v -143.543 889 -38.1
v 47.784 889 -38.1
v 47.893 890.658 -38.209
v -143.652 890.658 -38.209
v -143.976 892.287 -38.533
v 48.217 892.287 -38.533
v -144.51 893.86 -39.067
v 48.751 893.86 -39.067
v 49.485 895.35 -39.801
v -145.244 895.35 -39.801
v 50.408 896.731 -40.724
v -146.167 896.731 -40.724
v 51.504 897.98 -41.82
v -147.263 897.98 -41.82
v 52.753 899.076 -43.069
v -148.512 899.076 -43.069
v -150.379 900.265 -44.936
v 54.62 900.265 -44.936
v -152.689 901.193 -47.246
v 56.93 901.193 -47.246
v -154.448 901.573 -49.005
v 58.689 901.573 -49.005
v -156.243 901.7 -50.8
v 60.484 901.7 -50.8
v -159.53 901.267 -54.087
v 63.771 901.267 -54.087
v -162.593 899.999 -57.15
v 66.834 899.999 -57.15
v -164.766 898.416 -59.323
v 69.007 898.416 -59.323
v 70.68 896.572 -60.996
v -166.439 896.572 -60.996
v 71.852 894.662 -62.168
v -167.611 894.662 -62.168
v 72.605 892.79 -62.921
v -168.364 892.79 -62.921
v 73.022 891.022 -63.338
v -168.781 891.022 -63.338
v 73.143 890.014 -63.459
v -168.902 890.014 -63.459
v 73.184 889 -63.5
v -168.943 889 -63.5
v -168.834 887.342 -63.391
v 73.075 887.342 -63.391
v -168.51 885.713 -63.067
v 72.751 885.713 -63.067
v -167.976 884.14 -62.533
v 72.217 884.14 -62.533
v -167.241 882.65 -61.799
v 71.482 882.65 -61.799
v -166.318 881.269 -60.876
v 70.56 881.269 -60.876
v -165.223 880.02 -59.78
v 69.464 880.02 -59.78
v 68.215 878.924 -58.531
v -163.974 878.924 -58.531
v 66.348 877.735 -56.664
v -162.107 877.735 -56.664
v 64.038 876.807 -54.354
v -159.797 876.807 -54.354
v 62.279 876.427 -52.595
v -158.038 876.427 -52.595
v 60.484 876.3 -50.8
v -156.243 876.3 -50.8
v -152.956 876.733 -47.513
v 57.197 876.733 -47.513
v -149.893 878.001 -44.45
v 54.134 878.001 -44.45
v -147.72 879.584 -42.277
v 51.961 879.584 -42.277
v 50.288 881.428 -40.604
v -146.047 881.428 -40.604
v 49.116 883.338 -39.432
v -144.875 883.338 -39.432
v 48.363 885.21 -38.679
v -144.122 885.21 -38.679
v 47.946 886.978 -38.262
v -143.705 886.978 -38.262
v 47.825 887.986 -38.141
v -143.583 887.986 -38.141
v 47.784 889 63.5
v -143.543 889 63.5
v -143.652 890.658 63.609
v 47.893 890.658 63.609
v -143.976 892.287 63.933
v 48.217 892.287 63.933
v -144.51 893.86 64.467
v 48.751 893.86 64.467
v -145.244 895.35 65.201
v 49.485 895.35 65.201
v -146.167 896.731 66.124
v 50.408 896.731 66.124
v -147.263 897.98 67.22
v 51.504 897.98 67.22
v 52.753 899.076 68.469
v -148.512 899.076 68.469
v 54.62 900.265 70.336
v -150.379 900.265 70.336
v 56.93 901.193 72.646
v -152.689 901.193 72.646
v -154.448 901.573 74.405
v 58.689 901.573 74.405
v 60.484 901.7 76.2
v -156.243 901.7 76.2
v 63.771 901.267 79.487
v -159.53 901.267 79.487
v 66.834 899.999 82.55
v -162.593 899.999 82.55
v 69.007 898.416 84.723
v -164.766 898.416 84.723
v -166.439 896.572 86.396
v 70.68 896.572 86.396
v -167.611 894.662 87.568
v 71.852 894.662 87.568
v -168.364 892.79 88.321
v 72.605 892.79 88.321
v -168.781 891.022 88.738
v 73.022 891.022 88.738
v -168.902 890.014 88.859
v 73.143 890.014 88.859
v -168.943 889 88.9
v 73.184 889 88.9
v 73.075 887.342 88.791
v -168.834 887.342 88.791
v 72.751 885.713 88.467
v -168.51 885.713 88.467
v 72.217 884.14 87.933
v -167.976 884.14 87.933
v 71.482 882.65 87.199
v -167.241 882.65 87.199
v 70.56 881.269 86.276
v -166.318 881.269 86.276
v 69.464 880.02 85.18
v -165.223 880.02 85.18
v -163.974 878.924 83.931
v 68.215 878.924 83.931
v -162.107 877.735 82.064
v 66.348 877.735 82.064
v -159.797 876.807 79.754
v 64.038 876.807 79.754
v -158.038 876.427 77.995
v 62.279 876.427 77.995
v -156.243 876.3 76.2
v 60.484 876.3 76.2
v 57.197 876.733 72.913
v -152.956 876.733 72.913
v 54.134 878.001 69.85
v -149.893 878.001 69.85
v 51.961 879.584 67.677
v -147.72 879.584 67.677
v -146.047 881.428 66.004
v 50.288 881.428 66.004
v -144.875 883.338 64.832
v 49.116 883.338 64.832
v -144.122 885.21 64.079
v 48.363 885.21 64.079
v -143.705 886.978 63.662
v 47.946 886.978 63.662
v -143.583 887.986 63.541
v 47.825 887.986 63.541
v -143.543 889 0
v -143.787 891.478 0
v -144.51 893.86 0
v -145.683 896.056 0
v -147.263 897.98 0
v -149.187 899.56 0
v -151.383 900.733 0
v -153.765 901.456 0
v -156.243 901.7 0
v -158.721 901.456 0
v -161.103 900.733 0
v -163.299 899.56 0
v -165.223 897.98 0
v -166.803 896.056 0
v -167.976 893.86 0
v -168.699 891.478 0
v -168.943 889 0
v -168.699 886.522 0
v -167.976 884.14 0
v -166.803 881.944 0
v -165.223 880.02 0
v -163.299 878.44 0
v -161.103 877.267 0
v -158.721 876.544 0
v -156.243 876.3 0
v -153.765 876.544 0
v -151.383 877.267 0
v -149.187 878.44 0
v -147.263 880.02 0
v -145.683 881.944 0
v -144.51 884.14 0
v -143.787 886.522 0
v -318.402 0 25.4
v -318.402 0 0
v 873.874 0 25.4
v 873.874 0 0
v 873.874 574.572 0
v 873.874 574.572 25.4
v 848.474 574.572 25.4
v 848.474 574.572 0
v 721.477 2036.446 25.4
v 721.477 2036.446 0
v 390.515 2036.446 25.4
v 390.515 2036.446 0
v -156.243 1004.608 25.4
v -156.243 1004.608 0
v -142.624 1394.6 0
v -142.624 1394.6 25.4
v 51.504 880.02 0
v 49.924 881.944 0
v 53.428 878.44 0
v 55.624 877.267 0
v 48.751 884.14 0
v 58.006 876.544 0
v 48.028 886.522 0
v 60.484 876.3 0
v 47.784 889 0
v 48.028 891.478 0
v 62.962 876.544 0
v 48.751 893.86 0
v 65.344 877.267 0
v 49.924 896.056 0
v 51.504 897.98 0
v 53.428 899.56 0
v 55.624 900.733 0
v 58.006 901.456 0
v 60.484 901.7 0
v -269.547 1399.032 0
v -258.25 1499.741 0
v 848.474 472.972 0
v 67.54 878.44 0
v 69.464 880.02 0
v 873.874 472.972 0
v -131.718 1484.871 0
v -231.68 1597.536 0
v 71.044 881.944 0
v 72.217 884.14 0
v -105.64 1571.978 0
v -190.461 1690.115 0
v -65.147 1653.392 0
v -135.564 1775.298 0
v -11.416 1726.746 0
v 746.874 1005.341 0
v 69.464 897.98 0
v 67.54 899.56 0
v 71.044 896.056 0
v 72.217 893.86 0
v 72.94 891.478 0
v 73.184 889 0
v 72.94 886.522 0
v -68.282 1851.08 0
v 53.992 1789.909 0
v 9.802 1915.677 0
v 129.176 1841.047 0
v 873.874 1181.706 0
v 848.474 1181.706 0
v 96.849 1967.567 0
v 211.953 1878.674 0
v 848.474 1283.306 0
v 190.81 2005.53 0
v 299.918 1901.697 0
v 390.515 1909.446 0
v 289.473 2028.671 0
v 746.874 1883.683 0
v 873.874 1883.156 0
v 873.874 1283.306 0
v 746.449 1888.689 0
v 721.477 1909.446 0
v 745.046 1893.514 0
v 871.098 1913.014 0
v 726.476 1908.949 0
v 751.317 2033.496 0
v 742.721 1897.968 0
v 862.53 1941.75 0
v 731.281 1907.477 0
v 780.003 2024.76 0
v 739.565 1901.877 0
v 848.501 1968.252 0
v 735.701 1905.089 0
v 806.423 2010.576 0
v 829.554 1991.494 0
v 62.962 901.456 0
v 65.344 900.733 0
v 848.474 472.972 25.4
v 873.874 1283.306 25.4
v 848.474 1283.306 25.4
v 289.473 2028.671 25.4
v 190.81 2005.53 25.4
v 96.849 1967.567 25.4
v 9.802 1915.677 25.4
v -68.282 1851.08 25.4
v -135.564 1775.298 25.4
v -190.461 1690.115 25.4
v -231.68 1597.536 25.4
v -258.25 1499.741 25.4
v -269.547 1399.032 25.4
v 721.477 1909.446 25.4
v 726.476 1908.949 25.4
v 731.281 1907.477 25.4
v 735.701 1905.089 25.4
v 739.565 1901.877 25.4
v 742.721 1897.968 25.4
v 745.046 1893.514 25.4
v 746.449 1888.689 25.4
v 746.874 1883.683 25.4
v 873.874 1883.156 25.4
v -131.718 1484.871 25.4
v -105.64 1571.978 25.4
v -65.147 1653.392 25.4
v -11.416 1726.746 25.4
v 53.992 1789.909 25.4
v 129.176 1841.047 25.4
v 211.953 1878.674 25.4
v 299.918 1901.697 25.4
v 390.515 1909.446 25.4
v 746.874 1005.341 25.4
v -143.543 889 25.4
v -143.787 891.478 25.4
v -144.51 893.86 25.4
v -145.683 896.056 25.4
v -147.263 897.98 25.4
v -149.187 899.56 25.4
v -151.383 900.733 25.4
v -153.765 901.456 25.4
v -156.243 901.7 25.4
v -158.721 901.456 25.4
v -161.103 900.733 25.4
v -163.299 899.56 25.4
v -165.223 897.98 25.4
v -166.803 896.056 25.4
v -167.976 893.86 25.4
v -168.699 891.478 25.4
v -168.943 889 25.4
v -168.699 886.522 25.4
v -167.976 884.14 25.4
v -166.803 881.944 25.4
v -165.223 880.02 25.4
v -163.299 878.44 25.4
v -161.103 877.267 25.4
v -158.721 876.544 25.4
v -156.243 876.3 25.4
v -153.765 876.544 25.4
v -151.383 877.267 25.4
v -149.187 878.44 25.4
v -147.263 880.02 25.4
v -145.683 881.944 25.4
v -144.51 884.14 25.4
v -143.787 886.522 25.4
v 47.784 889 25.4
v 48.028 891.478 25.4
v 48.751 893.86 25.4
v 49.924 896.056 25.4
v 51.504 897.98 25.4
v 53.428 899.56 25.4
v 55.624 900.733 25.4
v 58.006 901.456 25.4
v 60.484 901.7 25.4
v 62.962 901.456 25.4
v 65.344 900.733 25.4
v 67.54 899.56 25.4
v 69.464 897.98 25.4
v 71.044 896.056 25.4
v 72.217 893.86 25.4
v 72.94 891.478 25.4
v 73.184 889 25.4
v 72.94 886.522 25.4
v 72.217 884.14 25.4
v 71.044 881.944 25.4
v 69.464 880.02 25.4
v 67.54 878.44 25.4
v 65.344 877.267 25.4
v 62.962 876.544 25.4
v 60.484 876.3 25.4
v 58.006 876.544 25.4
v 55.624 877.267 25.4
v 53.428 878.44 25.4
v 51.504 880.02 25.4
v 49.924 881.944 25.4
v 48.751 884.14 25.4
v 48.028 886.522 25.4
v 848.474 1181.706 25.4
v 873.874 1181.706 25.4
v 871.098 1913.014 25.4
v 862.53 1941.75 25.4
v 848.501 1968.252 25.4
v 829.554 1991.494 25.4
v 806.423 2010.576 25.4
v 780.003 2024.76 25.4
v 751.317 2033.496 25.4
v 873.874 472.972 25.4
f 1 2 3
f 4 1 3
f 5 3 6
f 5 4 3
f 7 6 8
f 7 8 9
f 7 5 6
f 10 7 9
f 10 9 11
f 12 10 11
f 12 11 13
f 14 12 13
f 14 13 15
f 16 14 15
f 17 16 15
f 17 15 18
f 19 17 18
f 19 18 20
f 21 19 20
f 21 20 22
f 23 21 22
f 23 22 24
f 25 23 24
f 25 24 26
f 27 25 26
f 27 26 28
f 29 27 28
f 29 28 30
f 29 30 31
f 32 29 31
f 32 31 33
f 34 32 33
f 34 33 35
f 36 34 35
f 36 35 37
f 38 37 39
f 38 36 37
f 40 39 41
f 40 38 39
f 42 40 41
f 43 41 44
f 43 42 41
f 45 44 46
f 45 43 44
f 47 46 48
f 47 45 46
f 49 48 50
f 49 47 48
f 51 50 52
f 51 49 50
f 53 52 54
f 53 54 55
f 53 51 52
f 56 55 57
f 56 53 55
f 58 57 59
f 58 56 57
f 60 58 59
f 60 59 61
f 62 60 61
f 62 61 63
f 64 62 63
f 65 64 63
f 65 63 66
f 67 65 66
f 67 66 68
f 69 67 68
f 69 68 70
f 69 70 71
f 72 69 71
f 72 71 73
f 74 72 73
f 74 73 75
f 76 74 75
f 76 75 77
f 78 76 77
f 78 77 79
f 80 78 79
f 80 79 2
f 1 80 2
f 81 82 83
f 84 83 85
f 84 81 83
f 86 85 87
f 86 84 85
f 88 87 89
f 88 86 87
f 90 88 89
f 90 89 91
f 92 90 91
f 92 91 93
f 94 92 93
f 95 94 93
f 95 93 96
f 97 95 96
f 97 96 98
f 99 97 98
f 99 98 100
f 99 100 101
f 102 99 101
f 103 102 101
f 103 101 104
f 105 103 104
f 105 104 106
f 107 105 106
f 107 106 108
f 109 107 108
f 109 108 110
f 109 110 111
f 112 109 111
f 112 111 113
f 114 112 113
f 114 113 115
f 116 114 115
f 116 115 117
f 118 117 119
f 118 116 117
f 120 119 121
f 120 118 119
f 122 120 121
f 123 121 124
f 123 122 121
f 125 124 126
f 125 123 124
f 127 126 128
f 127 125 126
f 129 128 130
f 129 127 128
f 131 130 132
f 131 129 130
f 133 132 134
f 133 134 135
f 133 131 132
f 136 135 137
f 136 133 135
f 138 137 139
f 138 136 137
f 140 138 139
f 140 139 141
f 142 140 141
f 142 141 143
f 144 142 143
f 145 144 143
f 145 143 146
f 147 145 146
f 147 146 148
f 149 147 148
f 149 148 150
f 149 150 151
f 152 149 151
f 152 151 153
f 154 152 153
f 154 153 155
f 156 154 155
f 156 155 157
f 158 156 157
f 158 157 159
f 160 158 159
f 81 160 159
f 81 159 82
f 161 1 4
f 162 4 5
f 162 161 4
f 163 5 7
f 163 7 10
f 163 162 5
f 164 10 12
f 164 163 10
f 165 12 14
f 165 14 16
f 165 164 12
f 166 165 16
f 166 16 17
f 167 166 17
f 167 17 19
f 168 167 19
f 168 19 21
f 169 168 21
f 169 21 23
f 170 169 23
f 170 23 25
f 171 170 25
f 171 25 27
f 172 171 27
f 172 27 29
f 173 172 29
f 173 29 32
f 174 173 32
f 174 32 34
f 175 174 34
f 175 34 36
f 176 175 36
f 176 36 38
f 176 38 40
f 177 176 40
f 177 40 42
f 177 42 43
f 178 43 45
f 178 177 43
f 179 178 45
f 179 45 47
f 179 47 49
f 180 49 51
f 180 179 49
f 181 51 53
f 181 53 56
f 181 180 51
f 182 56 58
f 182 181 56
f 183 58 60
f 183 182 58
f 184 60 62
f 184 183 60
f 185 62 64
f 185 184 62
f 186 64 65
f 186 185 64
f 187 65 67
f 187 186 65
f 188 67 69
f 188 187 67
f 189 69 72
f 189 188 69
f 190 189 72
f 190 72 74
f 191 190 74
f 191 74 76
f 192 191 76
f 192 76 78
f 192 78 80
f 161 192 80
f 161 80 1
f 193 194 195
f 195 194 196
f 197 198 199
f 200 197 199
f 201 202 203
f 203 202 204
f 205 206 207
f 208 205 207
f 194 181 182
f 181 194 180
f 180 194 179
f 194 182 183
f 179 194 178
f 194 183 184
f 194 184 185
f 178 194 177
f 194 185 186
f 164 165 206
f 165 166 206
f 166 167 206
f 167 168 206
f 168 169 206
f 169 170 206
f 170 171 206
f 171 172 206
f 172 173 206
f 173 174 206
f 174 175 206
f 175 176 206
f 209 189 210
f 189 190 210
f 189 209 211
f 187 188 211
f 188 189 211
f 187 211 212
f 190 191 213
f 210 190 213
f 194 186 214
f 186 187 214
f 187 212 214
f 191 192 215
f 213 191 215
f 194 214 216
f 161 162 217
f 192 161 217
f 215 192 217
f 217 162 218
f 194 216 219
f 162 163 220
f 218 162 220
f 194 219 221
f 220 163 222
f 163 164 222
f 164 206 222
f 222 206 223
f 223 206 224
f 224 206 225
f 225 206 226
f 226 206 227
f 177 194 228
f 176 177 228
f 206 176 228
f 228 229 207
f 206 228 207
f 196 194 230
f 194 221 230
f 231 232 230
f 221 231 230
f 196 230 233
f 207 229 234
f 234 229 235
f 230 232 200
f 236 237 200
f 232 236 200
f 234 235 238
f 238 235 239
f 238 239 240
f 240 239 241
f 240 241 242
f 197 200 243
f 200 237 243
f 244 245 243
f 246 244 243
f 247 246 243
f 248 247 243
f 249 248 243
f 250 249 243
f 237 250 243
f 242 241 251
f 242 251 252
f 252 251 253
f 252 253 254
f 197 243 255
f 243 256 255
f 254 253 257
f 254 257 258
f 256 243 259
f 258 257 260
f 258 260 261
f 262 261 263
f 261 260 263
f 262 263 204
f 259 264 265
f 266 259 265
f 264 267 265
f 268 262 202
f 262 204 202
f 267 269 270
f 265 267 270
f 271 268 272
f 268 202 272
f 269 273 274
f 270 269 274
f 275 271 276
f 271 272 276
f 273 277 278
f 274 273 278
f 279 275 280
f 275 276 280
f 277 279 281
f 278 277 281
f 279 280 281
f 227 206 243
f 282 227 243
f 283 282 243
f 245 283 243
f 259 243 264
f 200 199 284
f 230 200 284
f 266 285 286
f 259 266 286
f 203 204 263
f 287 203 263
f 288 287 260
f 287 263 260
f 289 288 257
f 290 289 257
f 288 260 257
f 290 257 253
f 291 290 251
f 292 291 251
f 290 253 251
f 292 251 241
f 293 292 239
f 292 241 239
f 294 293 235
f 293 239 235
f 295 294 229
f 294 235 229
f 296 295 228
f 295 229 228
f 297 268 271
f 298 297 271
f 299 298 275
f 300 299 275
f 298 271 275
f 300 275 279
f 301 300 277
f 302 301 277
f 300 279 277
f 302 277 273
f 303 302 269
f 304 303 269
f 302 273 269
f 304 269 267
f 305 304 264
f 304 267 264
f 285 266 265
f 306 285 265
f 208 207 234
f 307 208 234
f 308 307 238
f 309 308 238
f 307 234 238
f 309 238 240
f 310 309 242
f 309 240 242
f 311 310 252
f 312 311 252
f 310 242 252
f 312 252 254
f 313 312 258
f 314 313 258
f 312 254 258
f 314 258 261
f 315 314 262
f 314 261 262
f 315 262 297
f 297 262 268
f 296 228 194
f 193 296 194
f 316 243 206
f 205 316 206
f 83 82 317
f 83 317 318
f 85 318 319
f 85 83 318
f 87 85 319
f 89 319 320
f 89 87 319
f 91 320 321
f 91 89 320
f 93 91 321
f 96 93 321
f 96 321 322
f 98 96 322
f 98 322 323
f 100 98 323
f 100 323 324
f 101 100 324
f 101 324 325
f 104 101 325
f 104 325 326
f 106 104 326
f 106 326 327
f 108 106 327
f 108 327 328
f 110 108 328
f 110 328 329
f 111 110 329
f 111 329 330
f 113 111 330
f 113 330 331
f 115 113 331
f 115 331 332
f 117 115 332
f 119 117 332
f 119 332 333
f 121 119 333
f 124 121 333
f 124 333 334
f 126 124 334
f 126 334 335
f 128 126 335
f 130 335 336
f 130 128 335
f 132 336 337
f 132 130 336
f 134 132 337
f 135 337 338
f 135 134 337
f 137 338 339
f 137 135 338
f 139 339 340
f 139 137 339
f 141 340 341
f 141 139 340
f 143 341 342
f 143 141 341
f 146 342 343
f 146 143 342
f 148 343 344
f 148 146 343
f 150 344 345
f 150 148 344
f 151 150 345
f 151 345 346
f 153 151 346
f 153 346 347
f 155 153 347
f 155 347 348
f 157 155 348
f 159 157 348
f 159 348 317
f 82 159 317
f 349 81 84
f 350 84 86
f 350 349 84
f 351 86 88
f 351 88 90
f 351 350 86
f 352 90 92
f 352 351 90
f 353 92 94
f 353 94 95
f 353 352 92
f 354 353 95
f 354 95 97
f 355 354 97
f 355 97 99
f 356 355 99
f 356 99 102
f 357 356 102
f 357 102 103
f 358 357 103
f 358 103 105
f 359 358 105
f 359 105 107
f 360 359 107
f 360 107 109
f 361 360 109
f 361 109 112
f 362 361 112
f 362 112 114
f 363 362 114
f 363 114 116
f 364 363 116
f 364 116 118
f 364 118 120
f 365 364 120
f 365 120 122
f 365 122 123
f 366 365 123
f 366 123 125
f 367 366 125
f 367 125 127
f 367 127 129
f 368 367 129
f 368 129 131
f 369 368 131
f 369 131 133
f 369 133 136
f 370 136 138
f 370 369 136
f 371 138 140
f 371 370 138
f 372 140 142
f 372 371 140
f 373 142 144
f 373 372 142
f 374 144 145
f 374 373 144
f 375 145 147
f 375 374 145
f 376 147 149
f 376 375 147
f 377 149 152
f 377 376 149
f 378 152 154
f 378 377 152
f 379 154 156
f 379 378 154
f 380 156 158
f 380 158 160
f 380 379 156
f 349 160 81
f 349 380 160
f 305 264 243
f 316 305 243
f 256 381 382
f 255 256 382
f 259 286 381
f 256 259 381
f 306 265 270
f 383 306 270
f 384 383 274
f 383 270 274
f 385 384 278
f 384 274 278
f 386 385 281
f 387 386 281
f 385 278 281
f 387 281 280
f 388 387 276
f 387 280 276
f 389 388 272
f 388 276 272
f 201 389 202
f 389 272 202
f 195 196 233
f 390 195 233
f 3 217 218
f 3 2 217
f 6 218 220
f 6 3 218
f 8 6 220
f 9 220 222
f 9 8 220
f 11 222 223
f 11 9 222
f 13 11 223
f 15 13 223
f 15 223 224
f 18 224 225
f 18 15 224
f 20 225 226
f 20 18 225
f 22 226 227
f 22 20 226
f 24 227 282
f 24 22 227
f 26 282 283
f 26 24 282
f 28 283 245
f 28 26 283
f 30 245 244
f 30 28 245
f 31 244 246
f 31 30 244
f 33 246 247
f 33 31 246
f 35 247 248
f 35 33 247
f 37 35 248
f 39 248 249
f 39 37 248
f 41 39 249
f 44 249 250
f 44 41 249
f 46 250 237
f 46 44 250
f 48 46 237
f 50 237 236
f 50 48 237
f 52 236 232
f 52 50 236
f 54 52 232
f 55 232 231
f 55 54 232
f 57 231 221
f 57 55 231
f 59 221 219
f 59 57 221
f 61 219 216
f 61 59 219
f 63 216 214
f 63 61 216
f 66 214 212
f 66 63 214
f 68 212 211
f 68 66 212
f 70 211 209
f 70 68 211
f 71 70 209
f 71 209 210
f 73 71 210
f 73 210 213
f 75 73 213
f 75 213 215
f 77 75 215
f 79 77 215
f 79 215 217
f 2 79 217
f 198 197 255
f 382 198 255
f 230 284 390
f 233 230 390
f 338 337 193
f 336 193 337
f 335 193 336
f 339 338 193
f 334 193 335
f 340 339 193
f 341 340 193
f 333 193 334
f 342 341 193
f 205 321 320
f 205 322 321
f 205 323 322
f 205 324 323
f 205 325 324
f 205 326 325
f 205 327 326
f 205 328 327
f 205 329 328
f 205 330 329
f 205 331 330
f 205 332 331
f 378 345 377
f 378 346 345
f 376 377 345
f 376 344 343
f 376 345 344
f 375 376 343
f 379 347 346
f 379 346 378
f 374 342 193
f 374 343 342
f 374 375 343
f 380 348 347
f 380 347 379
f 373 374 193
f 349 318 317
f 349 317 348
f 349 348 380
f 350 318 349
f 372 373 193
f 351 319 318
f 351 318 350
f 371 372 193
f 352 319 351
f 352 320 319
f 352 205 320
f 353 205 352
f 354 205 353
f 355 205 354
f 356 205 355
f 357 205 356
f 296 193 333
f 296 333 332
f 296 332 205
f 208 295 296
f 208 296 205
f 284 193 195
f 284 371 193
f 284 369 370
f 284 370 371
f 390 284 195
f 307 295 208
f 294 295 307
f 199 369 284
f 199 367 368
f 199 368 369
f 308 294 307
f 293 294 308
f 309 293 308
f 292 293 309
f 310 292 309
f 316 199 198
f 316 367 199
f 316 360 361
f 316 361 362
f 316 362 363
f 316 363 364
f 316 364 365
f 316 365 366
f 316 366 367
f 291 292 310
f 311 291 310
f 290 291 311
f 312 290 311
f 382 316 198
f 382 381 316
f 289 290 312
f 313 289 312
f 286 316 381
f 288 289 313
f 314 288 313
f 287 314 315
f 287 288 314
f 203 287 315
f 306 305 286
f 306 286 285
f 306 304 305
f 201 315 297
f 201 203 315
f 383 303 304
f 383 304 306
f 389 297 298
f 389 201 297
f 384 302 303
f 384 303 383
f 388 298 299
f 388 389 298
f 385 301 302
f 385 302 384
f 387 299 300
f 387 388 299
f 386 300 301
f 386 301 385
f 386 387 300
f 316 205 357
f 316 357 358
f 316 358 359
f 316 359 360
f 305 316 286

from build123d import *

# Parameters (mm, degrees)
BOSS_EXTRUDE1_DEPTH = 25.4
CUT_EXTRUDE1_DEPTH  = 2217.171715999
SWEEP2_PROFILE_R    = 12.7


with BuildPart() as part:
    # Sketch1 → Boss-Extrude1 (new body)
    with BuildSketch(Plane.XY):
        with BuildLine():
            Line((-318.401962341, 0), (873.874037659, 0))
            Line((873.874037659, 0), (873.874037659, 1883.156))
            ThreePointArc((873.874037659, 1883.156), (829.553846601, 1991.493828188), (721.476635331, 2036.44581097))
            Line((721.476635331, 2036.44581097), (390.514635331, 2036.44581097))
            ThreePointArc((390.514635331, 2036.44581097), (-68.281974684, 1851.0799482), (-269.546688357, 1399.032))
            Line((-269.546688357, 1399.032), (-318.401962341, 0))
        make_face()
        with BuildLine():
            Line((-156.242870874, 1004.607855187), (-142.624053326, 1394.599763919))
            ThreePointArc((-142.624053326, 1394.599763919), (19.939638364, 1759.723793557), (390.514635331, 1909.44581097))
            Line((390.514635331, 1909.44581097), (721.476635331, 1909.44581097))
            ThreePointArc((721.476635331, 1909.44581097), (739.565122057, 1901.8774303), (746.874037659, 1883.682554903))
            Line((746.874037659, 1883.682554903), (746.874037659, 1005.341277451))
            Line((746.874037659, 1005.341277451), (-156.242870874, 1004.607855187))
        make_face(mode=Mode.SUBTRACT)
    extrude(amount=BOSS_EXTRUDE1_DEPTH)

    # Sketch2 → Cut-Extrude1 (cut, through all)
    with BuildSketch(Plane.XY.offset(25.4)):
        Polygon((873.874037659, 1232.505665346), (873.874037659, 1283.305665346), (848.474037659, 1283.305665346), (848.474037659, 1181.705665346), (873.874037659, 1181.705665346), align=None)
        Polygon((873.874037659, 523.771597211), (873.874037659, 574.571597211), (848.474037659, 574.571597211), (848.474037659, 472.971597211), (873.874037659, 472.971597211), align=None)
    extrude(amount=-CUT_EXTRUDE1_DEPTH, mode=Mode.SUBTRACT)

    # Sweep2: sweep along a path in Sketch5
    with BuildLine(Plane(origin=(0, 889, 0), x_dir=(1, 0, 0), z_dir=(0, 1, 0))) as sweep2_path:
        Line((-156.242870874, -25.4), (-156.242870874, -76.2))
        Line((-156.242870874, -76.2), (60.483973487, -76.2))
        Line((60.483973487, -76.2), (60.483973487, -25.4))
        Line((60.483973487, -25.4), (60.483973487, 0))
        Line((60.483973487, 0), (60.483973487, 50.8))
        Line((60.483973487, 50.8), (-156.242870874, 50.8))
        Line((-156.242870874, 50.8), (-156.242870874, 0))
    # Sweep2 profile (on start of the path) → Sweep2 (sweep)
    with BuildSketch(Plane(origin=(-156.242870874, 889, 25.4), x_dir=(1, 0, 0), z_dir=(0, 0, 1))):
        Circle(SWEEP2_PROFILE_R)
    sweep(path=sweep2_path.line, transition=Transition.RIGHT)


solid = part.part
